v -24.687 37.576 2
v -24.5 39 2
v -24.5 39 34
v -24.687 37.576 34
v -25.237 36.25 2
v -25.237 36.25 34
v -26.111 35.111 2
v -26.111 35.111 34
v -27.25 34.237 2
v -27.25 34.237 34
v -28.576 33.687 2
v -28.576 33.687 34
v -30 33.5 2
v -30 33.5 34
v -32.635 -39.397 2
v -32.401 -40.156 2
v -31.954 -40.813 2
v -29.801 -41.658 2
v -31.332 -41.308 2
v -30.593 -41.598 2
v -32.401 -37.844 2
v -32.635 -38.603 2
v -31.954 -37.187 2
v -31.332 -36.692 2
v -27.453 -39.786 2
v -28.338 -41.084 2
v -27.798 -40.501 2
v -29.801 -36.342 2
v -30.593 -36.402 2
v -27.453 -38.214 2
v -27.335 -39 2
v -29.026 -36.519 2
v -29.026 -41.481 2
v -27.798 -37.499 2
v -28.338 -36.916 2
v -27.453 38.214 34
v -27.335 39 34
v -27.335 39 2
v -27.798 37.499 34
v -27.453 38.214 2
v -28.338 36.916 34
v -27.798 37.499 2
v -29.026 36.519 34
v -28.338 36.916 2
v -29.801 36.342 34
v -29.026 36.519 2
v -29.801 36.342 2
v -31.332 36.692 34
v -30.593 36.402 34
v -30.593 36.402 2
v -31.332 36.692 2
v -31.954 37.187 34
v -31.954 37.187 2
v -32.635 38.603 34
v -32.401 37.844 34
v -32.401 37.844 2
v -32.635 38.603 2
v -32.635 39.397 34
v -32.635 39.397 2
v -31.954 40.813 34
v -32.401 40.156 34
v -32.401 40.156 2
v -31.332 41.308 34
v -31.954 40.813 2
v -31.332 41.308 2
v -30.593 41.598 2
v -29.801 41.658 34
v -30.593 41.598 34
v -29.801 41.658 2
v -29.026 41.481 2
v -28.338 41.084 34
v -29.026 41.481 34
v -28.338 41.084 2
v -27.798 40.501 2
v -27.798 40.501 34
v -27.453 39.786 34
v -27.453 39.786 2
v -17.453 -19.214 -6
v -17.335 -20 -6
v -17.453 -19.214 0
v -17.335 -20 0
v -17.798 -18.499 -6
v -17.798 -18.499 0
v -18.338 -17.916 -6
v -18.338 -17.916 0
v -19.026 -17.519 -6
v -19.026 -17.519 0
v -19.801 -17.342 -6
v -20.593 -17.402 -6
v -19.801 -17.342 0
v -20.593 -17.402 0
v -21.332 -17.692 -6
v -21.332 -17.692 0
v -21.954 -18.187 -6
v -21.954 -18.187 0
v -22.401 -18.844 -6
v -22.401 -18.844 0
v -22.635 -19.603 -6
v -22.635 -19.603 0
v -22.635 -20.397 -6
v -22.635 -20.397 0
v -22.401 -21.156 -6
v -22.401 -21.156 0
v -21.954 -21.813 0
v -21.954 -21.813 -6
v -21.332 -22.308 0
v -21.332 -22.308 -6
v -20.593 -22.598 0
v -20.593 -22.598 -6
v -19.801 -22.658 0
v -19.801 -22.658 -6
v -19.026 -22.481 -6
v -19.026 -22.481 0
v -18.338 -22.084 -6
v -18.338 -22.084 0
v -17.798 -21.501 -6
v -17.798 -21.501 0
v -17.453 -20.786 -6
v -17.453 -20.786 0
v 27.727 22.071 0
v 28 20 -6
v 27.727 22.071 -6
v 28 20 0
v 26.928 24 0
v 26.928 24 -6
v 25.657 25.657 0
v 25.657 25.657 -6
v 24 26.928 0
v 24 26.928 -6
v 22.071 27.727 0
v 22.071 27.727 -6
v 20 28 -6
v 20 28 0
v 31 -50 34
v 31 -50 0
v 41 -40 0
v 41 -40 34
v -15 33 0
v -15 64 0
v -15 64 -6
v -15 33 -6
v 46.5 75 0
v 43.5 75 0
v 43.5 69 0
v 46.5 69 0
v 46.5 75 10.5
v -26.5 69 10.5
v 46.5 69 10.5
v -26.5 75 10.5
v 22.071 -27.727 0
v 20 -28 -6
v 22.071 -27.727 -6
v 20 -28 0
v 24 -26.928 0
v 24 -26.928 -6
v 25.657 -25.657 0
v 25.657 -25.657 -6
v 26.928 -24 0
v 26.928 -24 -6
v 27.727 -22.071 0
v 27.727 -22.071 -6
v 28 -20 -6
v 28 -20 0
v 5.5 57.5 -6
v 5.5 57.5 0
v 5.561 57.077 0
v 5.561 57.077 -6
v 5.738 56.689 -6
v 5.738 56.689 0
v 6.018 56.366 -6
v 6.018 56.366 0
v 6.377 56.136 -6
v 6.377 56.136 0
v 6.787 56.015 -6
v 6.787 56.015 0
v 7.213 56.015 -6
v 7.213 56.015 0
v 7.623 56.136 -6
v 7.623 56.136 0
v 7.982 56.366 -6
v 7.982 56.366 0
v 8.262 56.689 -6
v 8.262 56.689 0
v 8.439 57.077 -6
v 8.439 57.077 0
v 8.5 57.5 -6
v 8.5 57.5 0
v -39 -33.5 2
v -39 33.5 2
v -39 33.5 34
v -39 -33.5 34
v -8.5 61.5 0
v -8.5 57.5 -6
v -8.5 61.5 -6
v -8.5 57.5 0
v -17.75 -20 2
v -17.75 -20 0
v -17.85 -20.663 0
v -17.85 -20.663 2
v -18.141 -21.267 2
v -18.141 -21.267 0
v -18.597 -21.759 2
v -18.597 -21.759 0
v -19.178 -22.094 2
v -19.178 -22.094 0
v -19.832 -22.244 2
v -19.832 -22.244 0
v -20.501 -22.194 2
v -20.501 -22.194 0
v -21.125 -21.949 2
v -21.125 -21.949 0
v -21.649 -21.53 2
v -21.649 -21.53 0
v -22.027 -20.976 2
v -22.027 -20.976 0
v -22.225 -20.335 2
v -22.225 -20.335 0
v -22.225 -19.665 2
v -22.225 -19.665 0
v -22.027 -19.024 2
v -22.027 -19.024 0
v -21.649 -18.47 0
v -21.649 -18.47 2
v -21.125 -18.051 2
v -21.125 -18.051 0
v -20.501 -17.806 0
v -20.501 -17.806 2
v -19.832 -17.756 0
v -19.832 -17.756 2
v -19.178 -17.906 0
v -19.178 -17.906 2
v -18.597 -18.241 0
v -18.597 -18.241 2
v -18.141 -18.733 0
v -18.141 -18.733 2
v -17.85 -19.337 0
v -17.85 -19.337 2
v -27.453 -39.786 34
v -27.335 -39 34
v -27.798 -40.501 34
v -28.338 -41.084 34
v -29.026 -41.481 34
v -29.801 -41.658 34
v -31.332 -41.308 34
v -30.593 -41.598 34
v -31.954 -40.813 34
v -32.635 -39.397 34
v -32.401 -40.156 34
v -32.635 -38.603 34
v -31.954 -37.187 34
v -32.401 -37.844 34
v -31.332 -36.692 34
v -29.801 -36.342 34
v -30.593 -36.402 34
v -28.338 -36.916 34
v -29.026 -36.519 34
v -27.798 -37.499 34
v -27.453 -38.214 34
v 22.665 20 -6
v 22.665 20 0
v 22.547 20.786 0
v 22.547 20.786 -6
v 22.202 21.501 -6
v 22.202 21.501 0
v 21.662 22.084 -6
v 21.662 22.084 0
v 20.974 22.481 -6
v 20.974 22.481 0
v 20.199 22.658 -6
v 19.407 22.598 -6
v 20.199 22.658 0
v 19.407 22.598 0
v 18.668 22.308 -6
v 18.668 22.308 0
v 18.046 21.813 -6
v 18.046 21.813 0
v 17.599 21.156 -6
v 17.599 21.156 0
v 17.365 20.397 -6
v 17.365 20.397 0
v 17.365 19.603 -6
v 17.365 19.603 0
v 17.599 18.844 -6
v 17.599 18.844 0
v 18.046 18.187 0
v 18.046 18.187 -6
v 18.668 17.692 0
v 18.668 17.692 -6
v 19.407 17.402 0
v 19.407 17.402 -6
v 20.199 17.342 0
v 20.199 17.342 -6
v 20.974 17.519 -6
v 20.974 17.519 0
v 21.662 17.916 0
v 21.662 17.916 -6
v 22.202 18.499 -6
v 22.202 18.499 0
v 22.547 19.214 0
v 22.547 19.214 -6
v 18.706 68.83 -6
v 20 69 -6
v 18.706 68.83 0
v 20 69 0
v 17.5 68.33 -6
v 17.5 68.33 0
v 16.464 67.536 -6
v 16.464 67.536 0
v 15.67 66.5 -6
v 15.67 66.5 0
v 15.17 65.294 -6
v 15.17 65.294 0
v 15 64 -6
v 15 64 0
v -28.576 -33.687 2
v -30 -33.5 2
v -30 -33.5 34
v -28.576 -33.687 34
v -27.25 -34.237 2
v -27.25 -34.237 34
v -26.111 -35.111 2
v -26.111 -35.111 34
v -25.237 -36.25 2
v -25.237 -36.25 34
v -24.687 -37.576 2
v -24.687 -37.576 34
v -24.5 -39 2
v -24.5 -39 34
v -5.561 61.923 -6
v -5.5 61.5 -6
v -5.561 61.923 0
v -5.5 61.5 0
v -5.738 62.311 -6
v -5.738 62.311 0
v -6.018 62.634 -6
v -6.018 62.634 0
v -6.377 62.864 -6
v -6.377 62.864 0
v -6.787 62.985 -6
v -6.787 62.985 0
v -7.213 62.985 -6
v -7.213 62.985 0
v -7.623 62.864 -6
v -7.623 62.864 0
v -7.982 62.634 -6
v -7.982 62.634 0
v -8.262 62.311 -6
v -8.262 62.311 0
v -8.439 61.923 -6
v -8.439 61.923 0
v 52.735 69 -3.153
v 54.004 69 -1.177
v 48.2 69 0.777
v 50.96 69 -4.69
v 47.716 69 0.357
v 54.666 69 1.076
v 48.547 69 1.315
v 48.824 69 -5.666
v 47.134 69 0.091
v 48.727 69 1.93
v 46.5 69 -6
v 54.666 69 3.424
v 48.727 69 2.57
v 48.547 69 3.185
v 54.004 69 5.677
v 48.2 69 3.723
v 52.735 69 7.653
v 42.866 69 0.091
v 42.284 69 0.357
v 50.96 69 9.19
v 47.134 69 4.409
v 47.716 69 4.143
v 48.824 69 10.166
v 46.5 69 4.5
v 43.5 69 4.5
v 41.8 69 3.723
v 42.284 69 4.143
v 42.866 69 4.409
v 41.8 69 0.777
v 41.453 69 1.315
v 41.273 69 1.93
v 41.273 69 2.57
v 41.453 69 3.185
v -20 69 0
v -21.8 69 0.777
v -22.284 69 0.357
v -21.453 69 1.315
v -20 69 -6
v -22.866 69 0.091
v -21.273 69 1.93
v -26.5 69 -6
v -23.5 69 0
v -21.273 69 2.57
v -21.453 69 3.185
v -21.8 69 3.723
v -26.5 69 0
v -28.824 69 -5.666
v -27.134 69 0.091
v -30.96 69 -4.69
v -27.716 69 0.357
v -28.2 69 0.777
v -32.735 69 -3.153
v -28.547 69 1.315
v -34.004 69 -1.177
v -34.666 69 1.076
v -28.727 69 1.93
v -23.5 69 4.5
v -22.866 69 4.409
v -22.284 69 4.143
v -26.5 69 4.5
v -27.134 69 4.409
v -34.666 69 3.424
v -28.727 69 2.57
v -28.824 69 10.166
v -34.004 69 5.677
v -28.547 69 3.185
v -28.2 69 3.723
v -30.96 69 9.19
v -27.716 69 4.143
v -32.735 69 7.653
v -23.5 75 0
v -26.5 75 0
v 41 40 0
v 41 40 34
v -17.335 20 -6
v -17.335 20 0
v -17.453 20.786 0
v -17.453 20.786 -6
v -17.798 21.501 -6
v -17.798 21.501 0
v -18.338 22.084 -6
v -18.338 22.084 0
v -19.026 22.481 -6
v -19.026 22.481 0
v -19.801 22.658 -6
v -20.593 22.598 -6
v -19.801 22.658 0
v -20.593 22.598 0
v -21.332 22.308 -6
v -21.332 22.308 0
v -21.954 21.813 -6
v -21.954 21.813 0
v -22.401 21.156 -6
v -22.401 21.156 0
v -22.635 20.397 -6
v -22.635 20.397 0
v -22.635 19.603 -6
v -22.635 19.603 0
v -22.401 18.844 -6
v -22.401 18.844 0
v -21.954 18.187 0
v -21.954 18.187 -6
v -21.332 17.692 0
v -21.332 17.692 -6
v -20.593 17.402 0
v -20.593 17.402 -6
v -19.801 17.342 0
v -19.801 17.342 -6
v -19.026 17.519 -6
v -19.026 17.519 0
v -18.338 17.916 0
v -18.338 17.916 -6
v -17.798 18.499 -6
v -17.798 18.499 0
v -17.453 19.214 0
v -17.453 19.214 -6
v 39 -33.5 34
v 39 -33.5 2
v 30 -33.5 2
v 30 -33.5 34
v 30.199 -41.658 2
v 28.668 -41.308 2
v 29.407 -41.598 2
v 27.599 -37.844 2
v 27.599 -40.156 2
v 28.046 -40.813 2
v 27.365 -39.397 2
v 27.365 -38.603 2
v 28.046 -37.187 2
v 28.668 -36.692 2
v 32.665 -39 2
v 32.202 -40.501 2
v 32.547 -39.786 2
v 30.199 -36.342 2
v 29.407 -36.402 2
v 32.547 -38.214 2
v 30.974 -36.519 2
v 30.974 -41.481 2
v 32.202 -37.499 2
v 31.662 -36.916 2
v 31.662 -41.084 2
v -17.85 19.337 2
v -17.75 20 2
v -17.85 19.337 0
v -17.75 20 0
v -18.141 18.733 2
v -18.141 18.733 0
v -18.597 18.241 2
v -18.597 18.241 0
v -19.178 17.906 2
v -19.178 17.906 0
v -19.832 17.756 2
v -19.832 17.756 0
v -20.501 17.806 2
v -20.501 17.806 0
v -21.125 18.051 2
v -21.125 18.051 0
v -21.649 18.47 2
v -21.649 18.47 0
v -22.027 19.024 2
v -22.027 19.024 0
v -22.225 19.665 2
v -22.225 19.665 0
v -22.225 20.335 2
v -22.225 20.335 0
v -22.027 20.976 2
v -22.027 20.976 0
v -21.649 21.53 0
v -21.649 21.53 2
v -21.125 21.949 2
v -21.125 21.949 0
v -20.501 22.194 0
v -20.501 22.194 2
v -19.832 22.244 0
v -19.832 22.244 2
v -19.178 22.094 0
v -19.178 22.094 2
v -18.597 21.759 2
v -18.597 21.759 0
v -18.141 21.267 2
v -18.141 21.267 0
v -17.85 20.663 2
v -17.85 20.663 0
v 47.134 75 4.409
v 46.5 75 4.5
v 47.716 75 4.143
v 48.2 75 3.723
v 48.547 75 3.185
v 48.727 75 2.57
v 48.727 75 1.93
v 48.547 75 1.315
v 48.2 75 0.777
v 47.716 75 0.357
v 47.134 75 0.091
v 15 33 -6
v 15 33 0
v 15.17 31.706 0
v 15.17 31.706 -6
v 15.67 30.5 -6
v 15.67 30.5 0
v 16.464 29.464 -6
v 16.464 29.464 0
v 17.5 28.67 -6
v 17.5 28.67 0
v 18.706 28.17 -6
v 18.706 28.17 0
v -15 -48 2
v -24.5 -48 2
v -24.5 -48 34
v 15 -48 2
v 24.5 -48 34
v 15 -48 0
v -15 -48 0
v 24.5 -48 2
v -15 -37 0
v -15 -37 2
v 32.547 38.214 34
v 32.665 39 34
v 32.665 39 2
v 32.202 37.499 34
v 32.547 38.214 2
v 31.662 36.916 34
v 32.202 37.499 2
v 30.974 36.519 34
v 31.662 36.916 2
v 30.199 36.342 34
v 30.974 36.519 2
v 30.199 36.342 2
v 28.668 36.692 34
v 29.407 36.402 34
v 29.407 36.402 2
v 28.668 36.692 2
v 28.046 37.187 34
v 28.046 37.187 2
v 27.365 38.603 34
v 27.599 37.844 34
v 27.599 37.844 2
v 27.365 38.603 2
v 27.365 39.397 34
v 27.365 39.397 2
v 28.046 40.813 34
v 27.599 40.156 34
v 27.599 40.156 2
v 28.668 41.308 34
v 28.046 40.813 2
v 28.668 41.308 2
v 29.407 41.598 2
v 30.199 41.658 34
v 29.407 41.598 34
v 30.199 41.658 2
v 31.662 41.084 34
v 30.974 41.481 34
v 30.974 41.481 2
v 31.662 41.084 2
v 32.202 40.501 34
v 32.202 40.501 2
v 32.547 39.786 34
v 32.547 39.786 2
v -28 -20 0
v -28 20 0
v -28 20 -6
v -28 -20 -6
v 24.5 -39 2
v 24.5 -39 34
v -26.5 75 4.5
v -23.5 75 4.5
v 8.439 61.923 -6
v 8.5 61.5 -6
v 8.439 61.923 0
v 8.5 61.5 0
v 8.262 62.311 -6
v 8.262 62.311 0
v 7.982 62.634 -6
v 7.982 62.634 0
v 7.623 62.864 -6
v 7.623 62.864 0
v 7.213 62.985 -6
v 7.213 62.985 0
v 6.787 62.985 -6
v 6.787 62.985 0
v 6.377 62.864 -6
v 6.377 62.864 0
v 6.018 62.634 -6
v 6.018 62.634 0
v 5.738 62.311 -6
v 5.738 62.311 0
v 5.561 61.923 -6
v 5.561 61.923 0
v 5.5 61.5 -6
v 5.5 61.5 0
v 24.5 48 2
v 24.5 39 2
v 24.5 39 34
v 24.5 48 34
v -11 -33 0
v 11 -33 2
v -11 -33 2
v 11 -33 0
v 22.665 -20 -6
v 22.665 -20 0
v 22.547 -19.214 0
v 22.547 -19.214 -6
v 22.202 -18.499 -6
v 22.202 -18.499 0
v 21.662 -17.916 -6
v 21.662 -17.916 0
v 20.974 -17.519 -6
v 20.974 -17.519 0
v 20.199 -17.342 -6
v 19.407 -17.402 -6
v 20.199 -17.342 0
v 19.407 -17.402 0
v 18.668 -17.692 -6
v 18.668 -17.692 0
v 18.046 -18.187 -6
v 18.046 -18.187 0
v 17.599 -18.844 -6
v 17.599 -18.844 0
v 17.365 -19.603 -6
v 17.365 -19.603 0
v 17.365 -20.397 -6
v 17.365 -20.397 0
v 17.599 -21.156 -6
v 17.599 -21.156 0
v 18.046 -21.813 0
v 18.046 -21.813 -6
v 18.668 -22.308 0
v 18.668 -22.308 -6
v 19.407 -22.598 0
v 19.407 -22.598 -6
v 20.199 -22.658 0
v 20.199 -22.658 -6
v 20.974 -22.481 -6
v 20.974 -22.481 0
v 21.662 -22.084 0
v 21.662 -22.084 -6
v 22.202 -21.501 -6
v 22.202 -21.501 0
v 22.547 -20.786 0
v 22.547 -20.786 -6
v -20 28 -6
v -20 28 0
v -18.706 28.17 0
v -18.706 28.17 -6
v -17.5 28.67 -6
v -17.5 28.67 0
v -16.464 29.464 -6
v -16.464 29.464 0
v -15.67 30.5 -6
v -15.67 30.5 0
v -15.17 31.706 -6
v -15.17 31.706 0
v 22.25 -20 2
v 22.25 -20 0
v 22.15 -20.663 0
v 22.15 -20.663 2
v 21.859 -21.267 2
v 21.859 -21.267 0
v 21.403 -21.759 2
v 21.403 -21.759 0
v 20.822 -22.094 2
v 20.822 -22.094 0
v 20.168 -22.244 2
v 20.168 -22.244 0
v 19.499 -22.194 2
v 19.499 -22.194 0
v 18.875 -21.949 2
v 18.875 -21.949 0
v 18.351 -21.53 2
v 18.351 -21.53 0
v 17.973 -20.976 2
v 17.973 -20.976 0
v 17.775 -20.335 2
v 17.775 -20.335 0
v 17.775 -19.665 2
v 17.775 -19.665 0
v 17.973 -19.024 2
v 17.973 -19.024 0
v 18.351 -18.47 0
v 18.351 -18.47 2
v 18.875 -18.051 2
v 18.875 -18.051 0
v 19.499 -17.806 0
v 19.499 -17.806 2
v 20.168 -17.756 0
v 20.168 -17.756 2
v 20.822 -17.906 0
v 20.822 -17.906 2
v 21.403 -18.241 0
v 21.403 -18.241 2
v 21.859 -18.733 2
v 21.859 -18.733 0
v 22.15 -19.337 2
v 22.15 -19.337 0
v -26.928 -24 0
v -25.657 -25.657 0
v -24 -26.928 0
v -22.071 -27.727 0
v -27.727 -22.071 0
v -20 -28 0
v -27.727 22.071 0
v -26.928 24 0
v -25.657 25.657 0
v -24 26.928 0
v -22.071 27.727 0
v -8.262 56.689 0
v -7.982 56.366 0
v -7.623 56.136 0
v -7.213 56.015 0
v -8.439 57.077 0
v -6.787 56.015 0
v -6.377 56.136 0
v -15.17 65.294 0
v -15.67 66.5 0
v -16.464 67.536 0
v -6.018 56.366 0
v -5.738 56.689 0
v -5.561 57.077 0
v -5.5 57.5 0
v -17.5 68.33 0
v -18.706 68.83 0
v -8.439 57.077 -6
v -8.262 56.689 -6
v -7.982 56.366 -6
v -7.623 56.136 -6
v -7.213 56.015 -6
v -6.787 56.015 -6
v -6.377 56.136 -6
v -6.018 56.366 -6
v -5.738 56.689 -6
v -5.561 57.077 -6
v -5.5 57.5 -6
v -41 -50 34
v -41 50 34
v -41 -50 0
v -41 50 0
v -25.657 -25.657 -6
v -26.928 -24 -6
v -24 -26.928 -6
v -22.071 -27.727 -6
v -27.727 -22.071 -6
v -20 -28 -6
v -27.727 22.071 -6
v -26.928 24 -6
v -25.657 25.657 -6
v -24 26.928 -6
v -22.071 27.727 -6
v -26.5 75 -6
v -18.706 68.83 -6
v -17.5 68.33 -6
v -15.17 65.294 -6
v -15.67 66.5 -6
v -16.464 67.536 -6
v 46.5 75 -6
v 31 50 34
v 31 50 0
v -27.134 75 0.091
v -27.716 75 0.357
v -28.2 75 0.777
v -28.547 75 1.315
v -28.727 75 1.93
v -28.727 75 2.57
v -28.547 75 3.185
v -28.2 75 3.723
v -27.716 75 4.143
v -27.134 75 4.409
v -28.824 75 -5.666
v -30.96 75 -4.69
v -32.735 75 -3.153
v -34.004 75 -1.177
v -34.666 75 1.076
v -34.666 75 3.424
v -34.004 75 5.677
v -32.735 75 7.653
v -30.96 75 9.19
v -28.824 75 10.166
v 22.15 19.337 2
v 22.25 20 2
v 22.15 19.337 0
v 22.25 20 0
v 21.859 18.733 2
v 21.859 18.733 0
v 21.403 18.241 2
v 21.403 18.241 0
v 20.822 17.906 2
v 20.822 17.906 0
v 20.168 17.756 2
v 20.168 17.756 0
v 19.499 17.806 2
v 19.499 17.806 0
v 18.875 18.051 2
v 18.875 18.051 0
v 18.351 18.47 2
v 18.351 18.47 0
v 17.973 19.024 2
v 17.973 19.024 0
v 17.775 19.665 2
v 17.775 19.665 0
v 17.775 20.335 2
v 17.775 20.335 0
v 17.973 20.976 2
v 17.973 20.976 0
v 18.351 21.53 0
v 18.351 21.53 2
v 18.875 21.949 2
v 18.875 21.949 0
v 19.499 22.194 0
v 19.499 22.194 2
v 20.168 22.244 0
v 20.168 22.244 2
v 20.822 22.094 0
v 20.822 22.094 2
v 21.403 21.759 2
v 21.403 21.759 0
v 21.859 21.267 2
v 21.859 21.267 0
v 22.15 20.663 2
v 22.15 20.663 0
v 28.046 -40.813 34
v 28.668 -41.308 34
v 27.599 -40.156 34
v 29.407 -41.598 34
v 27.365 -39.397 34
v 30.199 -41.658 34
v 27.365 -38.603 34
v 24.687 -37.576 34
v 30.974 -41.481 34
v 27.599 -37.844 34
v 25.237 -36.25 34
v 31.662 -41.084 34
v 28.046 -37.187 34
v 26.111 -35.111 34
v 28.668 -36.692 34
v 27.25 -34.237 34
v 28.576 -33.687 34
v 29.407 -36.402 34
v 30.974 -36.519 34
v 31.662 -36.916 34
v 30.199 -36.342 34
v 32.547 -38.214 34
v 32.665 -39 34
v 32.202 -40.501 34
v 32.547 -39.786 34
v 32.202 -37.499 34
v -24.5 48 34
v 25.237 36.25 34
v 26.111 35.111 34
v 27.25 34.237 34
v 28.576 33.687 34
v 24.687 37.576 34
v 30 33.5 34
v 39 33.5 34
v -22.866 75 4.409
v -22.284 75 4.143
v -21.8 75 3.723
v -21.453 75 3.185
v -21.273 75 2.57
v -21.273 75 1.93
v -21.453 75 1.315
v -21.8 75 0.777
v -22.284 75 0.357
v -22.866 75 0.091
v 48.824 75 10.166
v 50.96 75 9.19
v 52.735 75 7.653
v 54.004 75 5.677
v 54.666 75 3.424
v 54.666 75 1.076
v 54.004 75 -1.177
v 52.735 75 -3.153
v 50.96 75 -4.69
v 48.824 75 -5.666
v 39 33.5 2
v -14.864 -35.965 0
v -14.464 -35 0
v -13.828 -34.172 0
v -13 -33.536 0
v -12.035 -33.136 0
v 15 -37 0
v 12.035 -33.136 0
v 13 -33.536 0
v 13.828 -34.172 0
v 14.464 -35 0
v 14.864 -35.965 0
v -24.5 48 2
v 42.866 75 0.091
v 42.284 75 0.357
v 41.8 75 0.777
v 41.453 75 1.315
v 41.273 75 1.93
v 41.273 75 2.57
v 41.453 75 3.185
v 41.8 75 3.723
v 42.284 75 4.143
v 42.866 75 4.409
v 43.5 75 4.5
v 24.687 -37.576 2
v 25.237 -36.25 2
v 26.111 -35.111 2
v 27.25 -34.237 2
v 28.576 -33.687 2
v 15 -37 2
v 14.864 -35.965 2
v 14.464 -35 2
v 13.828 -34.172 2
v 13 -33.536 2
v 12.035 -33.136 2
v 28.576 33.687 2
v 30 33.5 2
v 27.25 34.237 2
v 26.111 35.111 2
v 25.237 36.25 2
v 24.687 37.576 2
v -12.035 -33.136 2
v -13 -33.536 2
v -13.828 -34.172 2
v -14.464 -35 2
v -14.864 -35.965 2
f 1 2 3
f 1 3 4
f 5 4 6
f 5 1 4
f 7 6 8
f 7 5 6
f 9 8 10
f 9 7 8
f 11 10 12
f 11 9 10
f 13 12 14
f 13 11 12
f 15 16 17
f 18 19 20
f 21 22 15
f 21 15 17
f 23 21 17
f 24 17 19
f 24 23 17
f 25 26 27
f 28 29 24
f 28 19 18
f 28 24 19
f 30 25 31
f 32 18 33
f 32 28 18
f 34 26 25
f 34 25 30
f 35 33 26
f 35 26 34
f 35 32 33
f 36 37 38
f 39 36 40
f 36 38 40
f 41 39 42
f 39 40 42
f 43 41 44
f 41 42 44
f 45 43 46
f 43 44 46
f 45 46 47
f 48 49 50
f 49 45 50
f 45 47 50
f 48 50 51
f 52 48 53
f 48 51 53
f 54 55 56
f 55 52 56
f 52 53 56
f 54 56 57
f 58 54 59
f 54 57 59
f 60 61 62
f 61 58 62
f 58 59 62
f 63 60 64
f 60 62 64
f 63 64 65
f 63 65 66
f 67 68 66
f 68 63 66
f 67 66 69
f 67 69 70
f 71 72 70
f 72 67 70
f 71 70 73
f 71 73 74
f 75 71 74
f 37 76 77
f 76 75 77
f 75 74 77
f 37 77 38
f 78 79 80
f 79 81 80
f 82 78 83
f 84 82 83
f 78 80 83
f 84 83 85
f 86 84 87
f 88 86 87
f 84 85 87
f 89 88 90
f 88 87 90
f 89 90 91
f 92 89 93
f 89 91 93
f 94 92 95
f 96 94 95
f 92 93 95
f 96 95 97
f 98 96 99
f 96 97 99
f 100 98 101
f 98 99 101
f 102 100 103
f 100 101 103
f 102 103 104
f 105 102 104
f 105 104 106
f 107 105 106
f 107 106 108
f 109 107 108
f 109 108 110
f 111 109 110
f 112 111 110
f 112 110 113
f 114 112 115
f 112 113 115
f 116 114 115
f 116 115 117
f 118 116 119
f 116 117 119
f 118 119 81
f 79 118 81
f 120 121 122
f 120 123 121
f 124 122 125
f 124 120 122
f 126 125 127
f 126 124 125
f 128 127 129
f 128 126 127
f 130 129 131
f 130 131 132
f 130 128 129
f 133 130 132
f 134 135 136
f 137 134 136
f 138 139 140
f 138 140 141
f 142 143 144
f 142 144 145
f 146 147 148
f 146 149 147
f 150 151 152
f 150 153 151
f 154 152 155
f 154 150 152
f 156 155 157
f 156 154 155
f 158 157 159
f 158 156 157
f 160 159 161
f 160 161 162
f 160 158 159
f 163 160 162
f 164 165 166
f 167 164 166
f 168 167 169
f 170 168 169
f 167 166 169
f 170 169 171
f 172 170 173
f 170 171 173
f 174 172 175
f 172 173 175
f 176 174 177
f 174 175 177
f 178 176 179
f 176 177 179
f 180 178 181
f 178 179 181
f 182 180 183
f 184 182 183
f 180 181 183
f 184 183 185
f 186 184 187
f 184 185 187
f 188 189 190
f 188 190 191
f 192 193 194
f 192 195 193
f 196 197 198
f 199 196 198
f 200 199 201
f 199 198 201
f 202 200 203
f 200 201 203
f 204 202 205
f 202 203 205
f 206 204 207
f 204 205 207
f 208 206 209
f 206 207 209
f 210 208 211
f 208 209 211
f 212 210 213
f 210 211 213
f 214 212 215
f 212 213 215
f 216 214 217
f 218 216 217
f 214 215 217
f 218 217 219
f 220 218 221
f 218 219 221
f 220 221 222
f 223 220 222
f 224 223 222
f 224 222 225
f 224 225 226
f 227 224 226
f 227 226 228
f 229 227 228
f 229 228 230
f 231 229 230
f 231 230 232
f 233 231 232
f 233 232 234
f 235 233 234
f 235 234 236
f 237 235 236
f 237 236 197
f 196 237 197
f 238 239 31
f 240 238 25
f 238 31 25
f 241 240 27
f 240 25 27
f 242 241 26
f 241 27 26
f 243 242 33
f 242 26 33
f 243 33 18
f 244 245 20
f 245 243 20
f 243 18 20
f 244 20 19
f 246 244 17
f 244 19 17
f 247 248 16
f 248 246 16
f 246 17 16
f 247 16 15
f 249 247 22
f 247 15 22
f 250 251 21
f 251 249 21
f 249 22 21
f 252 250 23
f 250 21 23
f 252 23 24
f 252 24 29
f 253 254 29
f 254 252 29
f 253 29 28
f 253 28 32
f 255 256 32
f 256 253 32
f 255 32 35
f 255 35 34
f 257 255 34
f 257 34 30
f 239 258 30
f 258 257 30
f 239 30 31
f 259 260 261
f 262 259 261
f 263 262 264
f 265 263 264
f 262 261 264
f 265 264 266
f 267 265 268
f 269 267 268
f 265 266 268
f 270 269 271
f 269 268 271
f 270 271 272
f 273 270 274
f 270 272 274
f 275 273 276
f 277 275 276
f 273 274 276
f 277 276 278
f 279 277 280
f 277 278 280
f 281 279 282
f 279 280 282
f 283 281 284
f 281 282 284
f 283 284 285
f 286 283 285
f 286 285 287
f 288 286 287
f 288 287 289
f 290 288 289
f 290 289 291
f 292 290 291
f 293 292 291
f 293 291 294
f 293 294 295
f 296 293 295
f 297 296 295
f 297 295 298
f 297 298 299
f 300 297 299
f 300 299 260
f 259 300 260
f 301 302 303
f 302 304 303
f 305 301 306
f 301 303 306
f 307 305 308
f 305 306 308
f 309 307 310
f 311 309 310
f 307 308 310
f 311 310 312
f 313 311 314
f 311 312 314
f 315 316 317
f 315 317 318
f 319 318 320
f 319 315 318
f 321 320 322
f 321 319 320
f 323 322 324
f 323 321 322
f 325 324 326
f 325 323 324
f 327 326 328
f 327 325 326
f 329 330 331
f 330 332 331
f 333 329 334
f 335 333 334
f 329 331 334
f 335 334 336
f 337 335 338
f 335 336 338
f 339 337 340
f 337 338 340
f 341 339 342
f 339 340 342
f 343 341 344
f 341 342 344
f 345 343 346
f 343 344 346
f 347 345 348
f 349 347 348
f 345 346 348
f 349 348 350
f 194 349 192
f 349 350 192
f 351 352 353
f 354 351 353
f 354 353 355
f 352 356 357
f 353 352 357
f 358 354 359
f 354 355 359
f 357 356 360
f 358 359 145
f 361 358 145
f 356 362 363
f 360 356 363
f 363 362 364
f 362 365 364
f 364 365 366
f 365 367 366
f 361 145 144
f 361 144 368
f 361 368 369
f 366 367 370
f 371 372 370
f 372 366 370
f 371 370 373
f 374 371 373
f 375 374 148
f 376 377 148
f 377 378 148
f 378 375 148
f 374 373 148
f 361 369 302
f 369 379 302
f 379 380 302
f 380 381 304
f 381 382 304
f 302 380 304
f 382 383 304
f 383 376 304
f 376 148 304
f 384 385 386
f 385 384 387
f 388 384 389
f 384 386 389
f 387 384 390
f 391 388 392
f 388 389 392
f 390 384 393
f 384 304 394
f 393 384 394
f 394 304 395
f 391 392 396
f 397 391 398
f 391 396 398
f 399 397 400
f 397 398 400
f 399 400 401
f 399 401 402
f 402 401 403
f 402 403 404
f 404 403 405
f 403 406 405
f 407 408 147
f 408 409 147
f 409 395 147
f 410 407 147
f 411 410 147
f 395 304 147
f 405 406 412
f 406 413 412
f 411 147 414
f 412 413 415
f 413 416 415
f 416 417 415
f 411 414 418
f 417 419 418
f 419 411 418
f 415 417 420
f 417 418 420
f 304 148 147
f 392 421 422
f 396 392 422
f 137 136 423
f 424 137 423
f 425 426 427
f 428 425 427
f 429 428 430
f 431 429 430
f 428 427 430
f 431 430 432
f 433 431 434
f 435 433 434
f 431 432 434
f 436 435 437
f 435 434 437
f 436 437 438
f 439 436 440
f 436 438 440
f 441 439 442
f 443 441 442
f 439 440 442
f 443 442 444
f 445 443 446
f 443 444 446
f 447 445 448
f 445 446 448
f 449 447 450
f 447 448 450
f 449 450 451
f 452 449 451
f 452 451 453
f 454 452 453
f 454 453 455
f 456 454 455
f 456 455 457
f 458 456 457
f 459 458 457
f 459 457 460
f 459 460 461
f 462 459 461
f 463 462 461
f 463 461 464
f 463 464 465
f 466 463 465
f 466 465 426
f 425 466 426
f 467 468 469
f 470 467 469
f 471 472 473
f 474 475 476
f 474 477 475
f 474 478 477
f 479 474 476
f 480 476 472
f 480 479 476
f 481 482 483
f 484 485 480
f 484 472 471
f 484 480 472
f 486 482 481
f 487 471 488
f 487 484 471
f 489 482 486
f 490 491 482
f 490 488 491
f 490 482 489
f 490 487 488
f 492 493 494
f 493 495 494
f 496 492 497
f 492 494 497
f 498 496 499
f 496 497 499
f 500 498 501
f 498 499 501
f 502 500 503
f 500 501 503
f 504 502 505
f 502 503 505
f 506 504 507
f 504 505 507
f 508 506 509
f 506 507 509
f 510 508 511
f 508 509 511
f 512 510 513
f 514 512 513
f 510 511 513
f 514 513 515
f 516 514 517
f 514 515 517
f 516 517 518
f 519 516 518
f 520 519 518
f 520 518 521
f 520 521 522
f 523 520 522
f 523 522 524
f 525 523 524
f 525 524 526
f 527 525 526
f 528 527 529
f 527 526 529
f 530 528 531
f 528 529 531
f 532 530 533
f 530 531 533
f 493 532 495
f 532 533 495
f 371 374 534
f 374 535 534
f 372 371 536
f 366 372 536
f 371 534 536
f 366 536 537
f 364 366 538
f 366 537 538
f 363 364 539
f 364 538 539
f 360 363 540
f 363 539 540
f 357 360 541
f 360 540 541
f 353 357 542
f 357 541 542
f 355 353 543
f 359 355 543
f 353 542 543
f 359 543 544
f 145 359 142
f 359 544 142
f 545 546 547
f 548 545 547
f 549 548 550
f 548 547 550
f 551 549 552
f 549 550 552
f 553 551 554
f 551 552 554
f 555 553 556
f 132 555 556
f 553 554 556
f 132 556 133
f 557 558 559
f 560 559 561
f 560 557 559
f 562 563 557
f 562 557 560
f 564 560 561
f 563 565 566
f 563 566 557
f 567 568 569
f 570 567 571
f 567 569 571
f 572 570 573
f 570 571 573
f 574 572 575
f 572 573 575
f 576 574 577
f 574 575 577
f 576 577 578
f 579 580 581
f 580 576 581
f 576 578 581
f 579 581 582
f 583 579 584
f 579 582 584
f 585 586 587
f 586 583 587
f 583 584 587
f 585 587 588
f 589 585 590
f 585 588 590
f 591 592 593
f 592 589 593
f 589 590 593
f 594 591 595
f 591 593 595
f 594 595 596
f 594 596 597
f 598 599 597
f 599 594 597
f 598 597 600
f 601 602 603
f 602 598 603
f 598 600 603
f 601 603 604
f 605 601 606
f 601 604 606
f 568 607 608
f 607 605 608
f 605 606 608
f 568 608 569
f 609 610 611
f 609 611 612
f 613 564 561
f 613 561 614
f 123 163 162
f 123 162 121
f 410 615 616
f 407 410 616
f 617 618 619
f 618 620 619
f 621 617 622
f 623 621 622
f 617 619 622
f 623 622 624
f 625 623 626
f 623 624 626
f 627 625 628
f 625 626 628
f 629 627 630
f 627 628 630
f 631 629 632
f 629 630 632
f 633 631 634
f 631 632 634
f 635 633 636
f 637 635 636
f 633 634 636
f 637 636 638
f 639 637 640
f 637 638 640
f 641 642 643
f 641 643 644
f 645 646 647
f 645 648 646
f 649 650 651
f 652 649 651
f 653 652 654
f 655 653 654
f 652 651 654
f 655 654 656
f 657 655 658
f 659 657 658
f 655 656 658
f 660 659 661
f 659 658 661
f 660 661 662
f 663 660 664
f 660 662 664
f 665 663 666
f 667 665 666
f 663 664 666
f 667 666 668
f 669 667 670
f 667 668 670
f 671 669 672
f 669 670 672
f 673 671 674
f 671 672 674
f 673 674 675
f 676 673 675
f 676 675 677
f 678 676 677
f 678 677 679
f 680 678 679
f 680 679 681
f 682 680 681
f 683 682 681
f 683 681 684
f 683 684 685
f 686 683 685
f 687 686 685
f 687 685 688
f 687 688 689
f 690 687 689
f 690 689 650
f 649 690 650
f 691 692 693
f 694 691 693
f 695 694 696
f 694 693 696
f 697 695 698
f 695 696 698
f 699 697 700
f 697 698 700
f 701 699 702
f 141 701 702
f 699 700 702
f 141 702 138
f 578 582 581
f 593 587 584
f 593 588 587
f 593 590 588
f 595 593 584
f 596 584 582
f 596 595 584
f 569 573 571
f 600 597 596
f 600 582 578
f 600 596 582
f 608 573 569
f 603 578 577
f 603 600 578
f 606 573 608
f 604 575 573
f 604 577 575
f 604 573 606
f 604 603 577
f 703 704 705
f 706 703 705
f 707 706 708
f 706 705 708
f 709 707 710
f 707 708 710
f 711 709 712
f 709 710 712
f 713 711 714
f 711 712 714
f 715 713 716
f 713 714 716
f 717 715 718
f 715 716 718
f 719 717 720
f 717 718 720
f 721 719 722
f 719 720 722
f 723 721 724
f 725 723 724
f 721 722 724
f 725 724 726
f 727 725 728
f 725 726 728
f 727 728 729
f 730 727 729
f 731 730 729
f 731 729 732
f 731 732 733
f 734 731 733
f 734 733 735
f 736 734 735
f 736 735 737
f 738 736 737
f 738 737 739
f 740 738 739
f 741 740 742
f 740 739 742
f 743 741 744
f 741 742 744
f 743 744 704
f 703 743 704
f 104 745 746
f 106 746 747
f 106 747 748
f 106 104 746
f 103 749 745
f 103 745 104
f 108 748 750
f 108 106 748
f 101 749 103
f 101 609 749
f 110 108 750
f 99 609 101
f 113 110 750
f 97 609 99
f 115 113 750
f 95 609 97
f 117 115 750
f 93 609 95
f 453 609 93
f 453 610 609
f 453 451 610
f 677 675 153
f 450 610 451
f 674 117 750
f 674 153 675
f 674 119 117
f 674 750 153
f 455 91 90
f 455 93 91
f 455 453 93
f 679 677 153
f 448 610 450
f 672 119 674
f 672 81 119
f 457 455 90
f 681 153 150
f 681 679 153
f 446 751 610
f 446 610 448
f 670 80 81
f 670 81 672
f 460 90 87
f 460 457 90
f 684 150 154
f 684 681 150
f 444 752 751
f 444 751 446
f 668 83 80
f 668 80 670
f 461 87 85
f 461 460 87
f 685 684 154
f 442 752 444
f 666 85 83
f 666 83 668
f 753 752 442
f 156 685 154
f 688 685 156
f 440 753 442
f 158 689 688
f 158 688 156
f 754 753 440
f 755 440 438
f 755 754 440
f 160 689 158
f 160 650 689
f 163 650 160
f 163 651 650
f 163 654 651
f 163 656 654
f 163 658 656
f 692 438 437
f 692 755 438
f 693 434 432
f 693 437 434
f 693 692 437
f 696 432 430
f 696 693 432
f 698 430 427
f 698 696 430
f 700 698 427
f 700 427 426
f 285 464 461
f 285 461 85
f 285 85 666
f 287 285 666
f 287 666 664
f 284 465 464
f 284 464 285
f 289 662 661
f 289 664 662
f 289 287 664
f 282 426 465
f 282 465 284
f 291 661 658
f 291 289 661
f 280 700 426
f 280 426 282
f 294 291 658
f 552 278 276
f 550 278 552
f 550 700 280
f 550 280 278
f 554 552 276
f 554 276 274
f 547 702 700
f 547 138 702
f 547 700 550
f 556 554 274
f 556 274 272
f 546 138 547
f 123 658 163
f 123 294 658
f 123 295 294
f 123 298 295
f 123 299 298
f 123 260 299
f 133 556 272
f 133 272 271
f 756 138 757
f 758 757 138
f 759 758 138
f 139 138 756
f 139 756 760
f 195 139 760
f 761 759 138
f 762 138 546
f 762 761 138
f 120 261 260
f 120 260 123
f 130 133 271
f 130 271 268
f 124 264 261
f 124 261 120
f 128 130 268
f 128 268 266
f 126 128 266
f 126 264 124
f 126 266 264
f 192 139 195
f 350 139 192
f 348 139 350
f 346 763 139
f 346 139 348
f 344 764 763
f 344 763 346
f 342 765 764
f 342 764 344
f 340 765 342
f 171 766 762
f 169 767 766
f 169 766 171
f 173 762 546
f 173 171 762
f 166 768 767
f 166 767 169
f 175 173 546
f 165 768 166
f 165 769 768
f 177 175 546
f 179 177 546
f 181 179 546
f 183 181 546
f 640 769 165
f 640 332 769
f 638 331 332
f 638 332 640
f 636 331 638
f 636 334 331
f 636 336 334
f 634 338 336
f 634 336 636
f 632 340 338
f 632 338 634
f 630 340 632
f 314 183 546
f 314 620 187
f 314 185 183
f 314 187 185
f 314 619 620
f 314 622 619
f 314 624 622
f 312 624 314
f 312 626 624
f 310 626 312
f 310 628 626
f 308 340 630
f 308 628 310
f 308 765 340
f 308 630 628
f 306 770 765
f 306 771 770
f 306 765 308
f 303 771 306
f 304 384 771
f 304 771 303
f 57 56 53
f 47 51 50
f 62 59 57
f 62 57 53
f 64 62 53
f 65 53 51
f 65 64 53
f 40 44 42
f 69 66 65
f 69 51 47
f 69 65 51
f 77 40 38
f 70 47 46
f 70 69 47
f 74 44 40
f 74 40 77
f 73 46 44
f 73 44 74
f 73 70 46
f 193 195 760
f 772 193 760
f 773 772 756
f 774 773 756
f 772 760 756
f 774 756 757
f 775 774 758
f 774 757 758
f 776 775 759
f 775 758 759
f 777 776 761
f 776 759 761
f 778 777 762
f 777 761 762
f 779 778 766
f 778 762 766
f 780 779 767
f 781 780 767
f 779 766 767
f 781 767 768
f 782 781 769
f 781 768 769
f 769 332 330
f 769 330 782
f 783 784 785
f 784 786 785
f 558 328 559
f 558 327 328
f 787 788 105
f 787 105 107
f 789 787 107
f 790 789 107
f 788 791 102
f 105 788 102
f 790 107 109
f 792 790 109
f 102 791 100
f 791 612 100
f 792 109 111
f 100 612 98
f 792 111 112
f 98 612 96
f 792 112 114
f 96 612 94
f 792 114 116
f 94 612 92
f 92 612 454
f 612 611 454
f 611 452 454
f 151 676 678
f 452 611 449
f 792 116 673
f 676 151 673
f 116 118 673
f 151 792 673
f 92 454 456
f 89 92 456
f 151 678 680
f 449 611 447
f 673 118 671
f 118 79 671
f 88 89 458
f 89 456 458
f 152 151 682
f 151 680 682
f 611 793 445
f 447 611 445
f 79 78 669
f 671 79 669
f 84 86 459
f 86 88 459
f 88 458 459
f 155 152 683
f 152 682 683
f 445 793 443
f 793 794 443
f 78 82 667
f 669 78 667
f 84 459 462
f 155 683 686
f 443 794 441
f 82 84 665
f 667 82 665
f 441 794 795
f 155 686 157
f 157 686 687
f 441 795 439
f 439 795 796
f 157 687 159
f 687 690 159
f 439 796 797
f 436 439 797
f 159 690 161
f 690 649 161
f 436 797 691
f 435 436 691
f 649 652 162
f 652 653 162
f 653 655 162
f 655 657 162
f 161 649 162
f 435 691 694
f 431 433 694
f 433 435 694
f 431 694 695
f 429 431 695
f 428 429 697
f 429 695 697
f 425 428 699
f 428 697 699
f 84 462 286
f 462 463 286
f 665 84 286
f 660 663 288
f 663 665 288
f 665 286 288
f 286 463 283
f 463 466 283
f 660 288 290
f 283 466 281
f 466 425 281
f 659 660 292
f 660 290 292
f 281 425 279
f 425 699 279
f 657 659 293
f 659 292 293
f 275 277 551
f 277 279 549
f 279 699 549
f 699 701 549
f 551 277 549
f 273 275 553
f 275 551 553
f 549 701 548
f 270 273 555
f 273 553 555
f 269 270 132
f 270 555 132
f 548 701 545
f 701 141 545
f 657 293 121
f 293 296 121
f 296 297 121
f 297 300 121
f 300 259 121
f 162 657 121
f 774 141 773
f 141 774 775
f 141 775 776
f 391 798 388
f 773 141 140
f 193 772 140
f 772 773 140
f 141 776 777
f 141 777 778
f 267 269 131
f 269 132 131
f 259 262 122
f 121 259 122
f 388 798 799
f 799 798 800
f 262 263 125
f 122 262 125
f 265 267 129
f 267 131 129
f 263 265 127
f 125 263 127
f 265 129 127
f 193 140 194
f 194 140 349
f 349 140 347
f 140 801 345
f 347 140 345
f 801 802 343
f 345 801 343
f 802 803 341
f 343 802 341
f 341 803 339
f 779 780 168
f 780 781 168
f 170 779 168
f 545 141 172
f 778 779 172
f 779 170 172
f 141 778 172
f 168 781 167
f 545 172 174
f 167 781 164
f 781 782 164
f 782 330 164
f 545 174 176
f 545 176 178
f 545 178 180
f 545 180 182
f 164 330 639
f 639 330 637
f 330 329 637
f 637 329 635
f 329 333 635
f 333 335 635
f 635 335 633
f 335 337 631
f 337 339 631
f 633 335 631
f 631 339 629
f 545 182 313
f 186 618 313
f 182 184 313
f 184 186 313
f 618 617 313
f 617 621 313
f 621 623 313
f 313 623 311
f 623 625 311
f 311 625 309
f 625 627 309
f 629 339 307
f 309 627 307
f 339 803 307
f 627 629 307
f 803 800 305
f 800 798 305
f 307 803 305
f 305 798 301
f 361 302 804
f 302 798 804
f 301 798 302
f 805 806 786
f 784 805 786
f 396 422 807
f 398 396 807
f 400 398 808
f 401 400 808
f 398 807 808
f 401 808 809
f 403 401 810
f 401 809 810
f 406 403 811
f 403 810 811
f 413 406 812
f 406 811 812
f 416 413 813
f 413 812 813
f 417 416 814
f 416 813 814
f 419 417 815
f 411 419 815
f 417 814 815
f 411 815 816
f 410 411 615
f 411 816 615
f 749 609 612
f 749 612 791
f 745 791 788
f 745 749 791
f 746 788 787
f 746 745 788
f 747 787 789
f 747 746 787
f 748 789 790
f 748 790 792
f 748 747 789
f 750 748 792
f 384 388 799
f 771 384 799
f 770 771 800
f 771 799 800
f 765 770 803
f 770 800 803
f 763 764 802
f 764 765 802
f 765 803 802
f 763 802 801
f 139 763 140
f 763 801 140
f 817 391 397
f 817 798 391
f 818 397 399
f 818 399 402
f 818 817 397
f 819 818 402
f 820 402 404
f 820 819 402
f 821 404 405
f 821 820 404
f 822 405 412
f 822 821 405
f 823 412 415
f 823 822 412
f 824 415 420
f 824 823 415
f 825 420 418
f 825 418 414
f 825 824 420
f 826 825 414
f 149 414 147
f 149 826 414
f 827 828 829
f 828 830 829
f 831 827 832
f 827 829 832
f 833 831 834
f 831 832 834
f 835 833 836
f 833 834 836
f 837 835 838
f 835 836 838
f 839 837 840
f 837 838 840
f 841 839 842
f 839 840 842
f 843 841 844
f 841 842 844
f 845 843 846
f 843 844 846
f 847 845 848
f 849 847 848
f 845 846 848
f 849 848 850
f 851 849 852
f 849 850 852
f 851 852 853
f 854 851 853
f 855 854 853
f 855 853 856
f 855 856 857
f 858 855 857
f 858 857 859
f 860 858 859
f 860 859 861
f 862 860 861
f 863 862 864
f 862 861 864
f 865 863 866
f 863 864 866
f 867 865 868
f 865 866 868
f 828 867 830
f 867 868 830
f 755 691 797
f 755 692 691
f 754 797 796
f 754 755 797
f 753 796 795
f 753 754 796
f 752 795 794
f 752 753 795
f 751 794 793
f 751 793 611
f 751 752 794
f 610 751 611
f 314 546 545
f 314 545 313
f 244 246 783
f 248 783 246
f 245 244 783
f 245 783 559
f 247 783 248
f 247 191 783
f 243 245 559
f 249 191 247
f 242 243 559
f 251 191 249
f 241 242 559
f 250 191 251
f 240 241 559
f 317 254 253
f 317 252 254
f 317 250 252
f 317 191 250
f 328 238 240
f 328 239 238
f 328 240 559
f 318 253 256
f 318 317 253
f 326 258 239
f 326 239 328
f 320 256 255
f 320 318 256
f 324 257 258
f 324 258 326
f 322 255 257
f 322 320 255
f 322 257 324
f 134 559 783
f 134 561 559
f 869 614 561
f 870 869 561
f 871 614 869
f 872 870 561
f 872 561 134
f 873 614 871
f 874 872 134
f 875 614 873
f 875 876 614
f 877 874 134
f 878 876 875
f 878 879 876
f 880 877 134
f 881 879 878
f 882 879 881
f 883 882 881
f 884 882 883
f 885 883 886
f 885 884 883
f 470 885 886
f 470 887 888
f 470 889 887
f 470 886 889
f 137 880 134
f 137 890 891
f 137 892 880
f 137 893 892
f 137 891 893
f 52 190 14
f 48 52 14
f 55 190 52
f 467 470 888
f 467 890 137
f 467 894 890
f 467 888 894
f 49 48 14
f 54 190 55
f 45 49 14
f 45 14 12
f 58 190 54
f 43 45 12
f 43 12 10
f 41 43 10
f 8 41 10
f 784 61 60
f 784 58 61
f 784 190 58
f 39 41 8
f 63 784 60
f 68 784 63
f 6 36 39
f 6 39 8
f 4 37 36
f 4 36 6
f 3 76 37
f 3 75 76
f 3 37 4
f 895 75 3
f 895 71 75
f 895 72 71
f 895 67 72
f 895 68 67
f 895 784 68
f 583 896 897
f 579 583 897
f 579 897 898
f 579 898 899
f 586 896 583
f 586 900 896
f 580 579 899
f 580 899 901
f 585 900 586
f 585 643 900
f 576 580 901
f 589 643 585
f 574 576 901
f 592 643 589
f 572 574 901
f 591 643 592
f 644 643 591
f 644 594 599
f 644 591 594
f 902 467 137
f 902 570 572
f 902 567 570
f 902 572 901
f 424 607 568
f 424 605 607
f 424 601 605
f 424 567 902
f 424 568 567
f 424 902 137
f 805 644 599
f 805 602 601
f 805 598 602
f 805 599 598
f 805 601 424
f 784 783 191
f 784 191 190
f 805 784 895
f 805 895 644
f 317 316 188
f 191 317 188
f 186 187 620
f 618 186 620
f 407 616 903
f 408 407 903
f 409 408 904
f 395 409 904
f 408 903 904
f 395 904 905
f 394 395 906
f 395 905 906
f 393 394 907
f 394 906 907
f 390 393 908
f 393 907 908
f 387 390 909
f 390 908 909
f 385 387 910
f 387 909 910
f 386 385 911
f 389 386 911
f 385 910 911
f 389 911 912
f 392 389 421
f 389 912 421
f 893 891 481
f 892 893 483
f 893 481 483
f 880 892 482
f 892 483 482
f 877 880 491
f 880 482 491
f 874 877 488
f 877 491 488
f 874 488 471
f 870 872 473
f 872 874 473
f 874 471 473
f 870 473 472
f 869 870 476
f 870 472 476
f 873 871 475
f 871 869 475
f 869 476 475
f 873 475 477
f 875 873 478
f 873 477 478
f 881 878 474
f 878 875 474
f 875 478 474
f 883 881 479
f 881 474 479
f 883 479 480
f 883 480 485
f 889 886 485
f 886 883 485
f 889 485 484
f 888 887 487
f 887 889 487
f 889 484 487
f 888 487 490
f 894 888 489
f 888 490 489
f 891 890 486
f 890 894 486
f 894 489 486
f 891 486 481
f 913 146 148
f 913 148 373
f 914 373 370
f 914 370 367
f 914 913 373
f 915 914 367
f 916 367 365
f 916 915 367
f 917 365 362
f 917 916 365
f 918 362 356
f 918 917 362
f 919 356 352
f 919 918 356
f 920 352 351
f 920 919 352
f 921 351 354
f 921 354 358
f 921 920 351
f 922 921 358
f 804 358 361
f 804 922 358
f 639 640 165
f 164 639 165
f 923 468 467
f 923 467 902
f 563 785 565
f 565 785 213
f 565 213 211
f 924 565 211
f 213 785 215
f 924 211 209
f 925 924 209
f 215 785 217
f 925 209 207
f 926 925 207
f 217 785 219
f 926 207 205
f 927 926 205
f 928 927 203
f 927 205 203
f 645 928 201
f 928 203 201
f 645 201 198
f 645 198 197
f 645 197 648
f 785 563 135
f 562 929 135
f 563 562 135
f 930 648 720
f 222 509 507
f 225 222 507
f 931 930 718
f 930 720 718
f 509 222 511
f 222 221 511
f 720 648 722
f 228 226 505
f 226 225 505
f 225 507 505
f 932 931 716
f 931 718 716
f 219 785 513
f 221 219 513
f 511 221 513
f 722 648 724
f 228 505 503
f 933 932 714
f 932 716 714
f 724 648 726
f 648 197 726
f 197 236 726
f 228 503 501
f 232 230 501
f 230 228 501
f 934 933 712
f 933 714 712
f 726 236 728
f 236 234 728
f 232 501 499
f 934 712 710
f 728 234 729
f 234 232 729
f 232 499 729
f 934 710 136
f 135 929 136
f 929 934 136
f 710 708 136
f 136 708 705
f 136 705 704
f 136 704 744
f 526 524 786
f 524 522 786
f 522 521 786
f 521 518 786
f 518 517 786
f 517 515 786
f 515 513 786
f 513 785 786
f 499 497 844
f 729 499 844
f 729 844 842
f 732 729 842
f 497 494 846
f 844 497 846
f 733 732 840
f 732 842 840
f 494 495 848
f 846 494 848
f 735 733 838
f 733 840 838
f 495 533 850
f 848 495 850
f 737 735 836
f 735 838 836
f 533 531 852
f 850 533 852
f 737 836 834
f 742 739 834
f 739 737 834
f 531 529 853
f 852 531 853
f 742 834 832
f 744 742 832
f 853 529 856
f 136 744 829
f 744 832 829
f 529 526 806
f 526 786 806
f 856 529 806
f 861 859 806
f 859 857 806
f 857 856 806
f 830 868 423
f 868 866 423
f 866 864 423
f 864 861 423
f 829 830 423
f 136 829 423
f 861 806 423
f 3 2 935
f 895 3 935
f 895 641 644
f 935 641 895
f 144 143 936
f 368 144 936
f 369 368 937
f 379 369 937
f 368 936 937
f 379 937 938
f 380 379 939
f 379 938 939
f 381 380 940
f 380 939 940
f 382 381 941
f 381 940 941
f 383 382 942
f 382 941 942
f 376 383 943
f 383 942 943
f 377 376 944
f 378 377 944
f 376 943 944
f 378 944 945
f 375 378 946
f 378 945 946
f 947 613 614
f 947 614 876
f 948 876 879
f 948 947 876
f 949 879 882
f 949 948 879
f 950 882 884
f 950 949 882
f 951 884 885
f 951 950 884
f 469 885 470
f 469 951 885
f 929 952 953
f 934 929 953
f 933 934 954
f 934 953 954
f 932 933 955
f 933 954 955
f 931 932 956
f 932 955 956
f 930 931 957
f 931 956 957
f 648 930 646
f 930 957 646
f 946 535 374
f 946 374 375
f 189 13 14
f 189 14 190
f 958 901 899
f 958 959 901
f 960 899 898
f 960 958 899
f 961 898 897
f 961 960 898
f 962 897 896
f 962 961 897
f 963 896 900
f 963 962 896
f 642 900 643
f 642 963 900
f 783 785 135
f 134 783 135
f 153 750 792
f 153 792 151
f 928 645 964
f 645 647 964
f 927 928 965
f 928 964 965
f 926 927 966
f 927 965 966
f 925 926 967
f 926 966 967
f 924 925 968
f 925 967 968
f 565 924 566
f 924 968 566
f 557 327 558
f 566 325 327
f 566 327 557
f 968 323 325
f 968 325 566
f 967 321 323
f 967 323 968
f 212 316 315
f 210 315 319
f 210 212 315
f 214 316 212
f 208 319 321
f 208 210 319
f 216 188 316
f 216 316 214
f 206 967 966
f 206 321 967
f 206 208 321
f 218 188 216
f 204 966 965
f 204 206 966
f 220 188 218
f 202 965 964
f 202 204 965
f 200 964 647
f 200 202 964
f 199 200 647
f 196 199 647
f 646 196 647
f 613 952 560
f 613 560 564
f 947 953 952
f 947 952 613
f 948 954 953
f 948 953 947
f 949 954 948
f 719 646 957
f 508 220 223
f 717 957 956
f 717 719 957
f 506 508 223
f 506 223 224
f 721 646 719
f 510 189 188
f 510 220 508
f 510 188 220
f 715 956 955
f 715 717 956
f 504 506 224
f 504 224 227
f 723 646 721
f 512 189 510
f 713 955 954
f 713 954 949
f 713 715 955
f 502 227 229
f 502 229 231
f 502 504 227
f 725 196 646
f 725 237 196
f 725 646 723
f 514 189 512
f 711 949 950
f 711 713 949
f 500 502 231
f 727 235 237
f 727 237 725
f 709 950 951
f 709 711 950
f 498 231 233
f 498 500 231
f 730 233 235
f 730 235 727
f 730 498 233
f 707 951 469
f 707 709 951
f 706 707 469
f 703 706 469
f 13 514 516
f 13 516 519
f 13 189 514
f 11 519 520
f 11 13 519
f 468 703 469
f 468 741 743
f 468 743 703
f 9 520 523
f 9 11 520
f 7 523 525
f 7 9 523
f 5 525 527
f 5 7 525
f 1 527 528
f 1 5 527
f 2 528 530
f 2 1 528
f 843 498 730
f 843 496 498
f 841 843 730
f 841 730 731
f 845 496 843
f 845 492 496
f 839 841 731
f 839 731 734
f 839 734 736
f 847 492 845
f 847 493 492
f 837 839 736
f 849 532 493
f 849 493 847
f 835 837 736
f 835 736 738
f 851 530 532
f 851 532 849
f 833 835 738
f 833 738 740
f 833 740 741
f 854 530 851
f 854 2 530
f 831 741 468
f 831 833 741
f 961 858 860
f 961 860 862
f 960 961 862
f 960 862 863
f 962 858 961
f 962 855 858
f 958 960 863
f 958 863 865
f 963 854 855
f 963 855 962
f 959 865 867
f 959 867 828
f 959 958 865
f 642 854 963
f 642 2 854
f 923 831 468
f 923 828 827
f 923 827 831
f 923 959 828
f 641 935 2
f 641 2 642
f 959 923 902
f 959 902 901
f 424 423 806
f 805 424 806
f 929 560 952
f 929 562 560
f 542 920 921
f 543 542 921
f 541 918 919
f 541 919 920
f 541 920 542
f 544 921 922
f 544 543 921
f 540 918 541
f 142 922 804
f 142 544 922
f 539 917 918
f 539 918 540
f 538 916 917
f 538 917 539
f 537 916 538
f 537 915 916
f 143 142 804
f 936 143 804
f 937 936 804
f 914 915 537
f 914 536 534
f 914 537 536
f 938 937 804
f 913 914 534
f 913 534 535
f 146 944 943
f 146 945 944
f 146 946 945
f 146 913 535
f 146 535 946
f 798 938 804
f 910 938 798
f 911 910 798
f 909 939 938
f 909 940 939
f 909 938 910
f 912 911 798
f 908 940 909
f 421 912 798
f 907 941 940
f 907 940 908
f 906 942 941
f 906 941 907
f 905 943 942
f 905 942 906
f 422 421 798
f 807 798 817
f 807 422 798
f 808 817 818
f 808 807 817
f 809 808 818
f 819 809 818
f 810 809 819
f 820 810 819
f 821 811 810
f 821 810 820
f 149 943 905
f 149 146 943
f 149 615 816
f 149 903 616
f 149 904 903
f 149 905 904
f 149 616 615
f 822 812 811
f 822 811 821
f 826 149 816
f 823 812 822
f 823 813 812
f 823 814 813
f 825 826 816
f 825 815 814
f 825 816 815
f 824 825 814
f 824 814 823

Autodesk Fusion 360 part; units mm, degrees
sketch "Sketch1" plane through (0, 0, 0) normal (0, 0, 1) x (1, 0, 0)
  line L0 (-41, 50) -> (-41, -50)
  line L1 (-41, -50) -> (31, -50)
  line L2 (31, -50) -> (41, -40)
  line L3 (41, -40) -> (41, 40)
  line L4 (41, 40) -> (31, 50)
  line L5 (31, 50) -> (-41, 50)
  line L6 (-30, 39) -> (30, 39) construction
  line L7 (30, 39) -> (30, -39) construction
  line L8 (30, -39) -> (-30, -39) construction
  line L9 (-30, -39) -> (-30, 39) construction
  line L10 (0, -39) -> (0, 39) construction
  line L11 (-41, 0) -> (41, 0) construction
  circle A0 centre (-30, 39) radius 2.665
  circle A1 centre (30, 39) radius 2.665
  circle A2 centre (30, -39) radius 2.665
  circle A3 centre (-30, -39) radius 2.665
  line L12 (30.1716, -48) -> (39, -39.1716)
  line L13 (39, -39.1716) -> (39, 39.1716)
  line L14 (39, 39.1716) -> (30.1716, 48)
  line L15 (30.1716, 48) -> (-39, 48)
  line L16 (-39, 48) -> (-39, -48)
  line L17 (-39, -48) -> (30.1716, -48)
  line L18 (-14, 37) -> (14, 37) construction
  line L19 (29, 22) -> (29, -22) construction
  line L20 (14, -37) -> (-14, -37) construction
  line L21 (-29, -22) -> (-29, 22) construction
  line L22 (-29, 0) -> (29, 0) construction
  arc A4 (29, 22) -> (14, 37) centre (14, 22) ccw construction
  arc A5 (-14, 37) -> (-29, 22) centre (-14, 22) ccw construction
  arc A6 (-29, -22) -> (-14, -37) centre (-14, -22) ccw construction
  arc A7 (14, -37) -> (29, -22) centre (14, -22) ccw construction
  arc A8 (24.5, 39) -> (30, 33.5) centre (30, 39) ccw
  arc A9 (30, -33.5) -> (24.5, -39) centre (30, -39) ccw
  line L23 (24.5, -48) -> (24.5, -39)
  line L24 (39, -33.5) -> (30, -33.5)
  line L25 (39, 33.5) -> (30, 33.5)
  line L26 (24.5, 39) -> (24.5, 48)
  arc A10 (-24.5, -39) -> (-30, -33.5) centre (-30, -39) ccw
  arc A11 (-30, 33.5) -> (-24.5, 39) centre (-30, 39) ccw
  line L27 (-30, 33.5) -> (-39, 33.5)
  line L28 (-24.5, 39) -> (-24.5, 48)
  line L29 (-30, -33.5) -> (-39, -33.5)
  line L30 (-24.5, -39) -> (-24.5, -48)
  line L31 (-15, -48) -> (15, -48)
  line L32 (15, -48) -> (15, -33)
  line L33 (15, -33) -> (-15, -33)
  line L34 (-15, -33) -> (-15, -48)
  point P0 (-29, 37)
  point P1 (29, 37)
  point P2 (-29, -37)
  point P3 (0, -33)
  dimension "d1" = 60
  dimension "d2" = 78
  dimension "d3" = 82
  dimension "d4" = 100
  dimension "d5" = 135
  dimension "d6" = 10
  dimension "d8" = 5.33
  dimension "d10" = 58
  dimension "d11" = 74
  dimension "d12" = 15
  dimension "d19" = 5.5
  dimension "d53" = 30
  dimension "d54" = 15
extrude "Extrude1" add sketch "Sketch1" along normal blind 2 contours L0 L1 L2 L3 L4 L5 | A0 | A1 | A2 | A3 | L12 L13 L17 A9 L23 L24 | L13 L15 L16 L17 A8 A9 L23 L24 L25 L26 A10 A11 L27 L28 L29 L30 L32 L33 L34 | L13 L14 L15 A8 L25 L26 | L16 L17 A10 L29 L30 | L15 L16 A11 L27 L28 makes body 1
extrude "Extrude2" add sketch "Sketch1" along normal blind 34 contours L0 L1 L2 L3 L4 L5 | L12 L13 L17 A9 L23 L24 | L13 L14 L15 A8 L25 L26 | L16 L17 A10 L29 L30 | L15 L16 A11 L27 L28 bodies 1
fillet "Fillet2" radius 4 2 edges at (-15, -33, 1) (15, -33, 1) on bodies 1
sketch "Sketch3" plane through (0, 0, 0) normal (0, 0, 1) x (1, 0, 0)
  line L0 (20, 20) -> (-20, 20) construction
  line L1 (-20, 20) -> (-20, -20) construction
  line L2 (-20, -20) -> (20, -20) construction
  line L3 (20, -20) -> (20, 20) construction
  line L4 (20, 0) -> (-20, 0) construction
  circle A0 centre (20, 20) radius 2.665
  circle A1 centre (-20, 20) radius 2.665
  circle A2 centre (-20, -20) radius 2.665
  circle A3 centre (20, -20) radius 2.665
  arc A4 (28, 20) -> (20, 28) centre (20, 20) ccw
  arc A5 (-20, 28) -> (-28, 20) centre (-20, 20) ccw
  arc A6 (-28, -20) -> (-20, -28) centre (-20, -20) ccw
  arc A7 (20, -28) -> (28, -20) centre (20, -20) ccw
  line L5 (28, -20) -> (28, 20)
  line L6 (20, 28) -> (-20, 28)
  line L7 (-28, 20) -> (-28, -20)
  line L8 (-20, -28) -> (20, -28)
  line L9 (31, 50) -> (-41, 50) construction
  line L10 (15, 75) -> (-15, 75)
  line L11 (-15, 75) -> (-15, 28)
  line L12 (-15, 28) -> (15, 28)
  line L13 (15, 28) -> (15, 75)
  line L14 (15, 50) -> (-15, 50) construction
  line L15 (0, 50) -> (0, 75) construction
  line L16 (7, 61.5) -> (7, 57.5) construction
  arc A8 (8.5, 61.5) -> (5.5, 61.5) centre (7, 61.5) ccw
  arc A9 (5.5, 57.5) -> (8.5, 57.5) centre (7, 57.5) ccw
  line L17 (8.5, 57.5) -> (8.5, 61.5)
  line L18 (5.5, 61.5) -> (5.5, 57.5)
  line L19 (-8.5, 57.5) -> (-8.5, 61.5)
  arc A10 (-5.5, 61.5) -> (-8.5, 61.5) centre (-7, 61.5) ccw
  arc A11 (-8.5, 57.5) -> (-5.5, 57.5) centre (-7, 57.5) ccw
  line L20 (-5.5, 61.5) -> (-5.5, 57.5)
  line L21 (7, 57.5) -> (15, 57.5) construction
  arc A12 (15, 33) -> (20, 28) centre (20, 33) ccw
  arc A13 (-20, 28) -> (-15, 33) centre (-20, 33) ccw
  line L22 (-15, 69) -> (15, 69) construction
  line L23 (7, 69) -> (7, 61.5) construction
  line L24 (7, 50) -> (7, 57.5) construction
  point P0 (7, 59.5)
  dimension "d24" = 40
  dimension "d25" = 40
  dimension "d26" = 5.33
  dimension "d28" = 8
  dimension "d32" = 30
  dimension "d48" = 25
  dimension "d50" = 1.5
  dimension "d51" = 4
  dimension "d66" = 7
  dimension "d67" = 6
sketch "Sketch7" plane through (0, 0, 0) normal (0, 0, 1) x (1, 0, 0)
  circle A0 centre (-20, 20) radius 2.25
  circle A1 centre (20, 20) radius 2.25
  circle A2 centre (20, -20) radius 2.25
  circle A3 centre (-20, -20) radius 2.25
  point P0 (-20, 20)
  point P1 (20, 20)
  point P2 (20, -20)
  point P3 (-20, -20)
  dimension "d61" = 4.5
extrude "Extrude7" cut sketch "Sketch7" along normal through all bodies 1
copy_body "Body->Comp1" bodies 1 removing the originals makes body 2 in component "Box"
extrude "Extrude5" add sketch "Sketch3" against normal blind 6 separate body makes body 3
sketch "Sketch4" plane through (0, 75, 0) normal (0, 1, 0) x (-1, 0, 0)
  line L0 (15, 0) -> (-15, 0)
  line L1 (15, -6) -> (15, 0)
  line L2 (-15, -6) -> (15, -6)
  line L3 (-15, 0) -> (-15, -6)
  arc A0 (26.5, -6) -> (26.5, 10.5) centre (26.5, 2.25) ccw
  arc A1 (-46.5, 10.5) -> (-46.5, -6) centre (-46.5, 2.25) ccw
  line L4 (26.5, 10.5) -> (-46.5, 10.5)
  line L5 (-46.5, -6) -> (26.5, -6)
  line L6 (26.5, 4.5) -> (23.5, 4.5)
  line L7 (23.5, 0) -> (26.5, 0)
  line L8 (26.5, 2.25) -> (23.5, 2.25) construction
  arc A2 (26.5, 0) -> (26.5, 4.5) centre (26.5, 2.25) ccw
  arc A3 (23.5, 4.5) -> (23.5, 0) centre (23.5, 2.25) ccw
  line L9 (-10, 10.5) -> (-10, -6) construction
  arc A4 (-43.5, 0) -> (-43.5, 4.5) centre (-43.5, 2.25) ccw
  arc A5 (-46.5, 4.5) -> (-46.5, 0) centre (-46.5, 2.25) ccw
  line L10 (-43.5, 0) -> (-46.5, 0)
  line L11 (-46.5, 4.5) -> (-43.5, 4.5)
  point P0 (25, 2.25)
  point P1 (-45, 2.25)
  point P2 (0, -6)
  dimension "d39" = 4.5
  dimension "d40" = 6
  dimension "d41" = 3
  dimension "d43" = 70
  dimension "d57" = 10
extrude "Extrude6" add sketch "Sketch4" against normal blind 6 bodies 3
fillet "Fillet3" radius 5 2 edges at (-15, 69, -3) (15, 69, -3) on bodies 3
copy_body "Body->Comp2" bodies 3 removing the originals makes body 4 in component "Mount"
component "Box" placed x (1, 0, 0) y (0, 1, 0) z (0, 0, 1) at (0, 0, 0)
component "Mount" placed x (1, 0, 0) y (0, 1, 0) z (0, 0, 1) at (0, 0, 0)
equation "d5 = 180 deg - 45 deg"
equation "BoxWallThickness = 2 mm"
equation "d8 = InsertDiameter"
equation "d9 = -BoxWallThickness"
equation "BoxDepth = 34 mm"
equation "d15 = BoxWallThickness"
equation "d17 = BoxDepth"
equation "d26 = InsertDiameter"
equation "MountThickness = 6 mm"
equation "d36 = -MountThickness"
equation "d40 = MountThickness"
equation "d44 = -MountThickness"
equation "d50 = ( 3 / 2 ) * 1 mm"
equation "InsertDiameter = 5.33 mm"
equation "InsertDepth = 6.5 mm"
equation "d67 = MountThickness"
